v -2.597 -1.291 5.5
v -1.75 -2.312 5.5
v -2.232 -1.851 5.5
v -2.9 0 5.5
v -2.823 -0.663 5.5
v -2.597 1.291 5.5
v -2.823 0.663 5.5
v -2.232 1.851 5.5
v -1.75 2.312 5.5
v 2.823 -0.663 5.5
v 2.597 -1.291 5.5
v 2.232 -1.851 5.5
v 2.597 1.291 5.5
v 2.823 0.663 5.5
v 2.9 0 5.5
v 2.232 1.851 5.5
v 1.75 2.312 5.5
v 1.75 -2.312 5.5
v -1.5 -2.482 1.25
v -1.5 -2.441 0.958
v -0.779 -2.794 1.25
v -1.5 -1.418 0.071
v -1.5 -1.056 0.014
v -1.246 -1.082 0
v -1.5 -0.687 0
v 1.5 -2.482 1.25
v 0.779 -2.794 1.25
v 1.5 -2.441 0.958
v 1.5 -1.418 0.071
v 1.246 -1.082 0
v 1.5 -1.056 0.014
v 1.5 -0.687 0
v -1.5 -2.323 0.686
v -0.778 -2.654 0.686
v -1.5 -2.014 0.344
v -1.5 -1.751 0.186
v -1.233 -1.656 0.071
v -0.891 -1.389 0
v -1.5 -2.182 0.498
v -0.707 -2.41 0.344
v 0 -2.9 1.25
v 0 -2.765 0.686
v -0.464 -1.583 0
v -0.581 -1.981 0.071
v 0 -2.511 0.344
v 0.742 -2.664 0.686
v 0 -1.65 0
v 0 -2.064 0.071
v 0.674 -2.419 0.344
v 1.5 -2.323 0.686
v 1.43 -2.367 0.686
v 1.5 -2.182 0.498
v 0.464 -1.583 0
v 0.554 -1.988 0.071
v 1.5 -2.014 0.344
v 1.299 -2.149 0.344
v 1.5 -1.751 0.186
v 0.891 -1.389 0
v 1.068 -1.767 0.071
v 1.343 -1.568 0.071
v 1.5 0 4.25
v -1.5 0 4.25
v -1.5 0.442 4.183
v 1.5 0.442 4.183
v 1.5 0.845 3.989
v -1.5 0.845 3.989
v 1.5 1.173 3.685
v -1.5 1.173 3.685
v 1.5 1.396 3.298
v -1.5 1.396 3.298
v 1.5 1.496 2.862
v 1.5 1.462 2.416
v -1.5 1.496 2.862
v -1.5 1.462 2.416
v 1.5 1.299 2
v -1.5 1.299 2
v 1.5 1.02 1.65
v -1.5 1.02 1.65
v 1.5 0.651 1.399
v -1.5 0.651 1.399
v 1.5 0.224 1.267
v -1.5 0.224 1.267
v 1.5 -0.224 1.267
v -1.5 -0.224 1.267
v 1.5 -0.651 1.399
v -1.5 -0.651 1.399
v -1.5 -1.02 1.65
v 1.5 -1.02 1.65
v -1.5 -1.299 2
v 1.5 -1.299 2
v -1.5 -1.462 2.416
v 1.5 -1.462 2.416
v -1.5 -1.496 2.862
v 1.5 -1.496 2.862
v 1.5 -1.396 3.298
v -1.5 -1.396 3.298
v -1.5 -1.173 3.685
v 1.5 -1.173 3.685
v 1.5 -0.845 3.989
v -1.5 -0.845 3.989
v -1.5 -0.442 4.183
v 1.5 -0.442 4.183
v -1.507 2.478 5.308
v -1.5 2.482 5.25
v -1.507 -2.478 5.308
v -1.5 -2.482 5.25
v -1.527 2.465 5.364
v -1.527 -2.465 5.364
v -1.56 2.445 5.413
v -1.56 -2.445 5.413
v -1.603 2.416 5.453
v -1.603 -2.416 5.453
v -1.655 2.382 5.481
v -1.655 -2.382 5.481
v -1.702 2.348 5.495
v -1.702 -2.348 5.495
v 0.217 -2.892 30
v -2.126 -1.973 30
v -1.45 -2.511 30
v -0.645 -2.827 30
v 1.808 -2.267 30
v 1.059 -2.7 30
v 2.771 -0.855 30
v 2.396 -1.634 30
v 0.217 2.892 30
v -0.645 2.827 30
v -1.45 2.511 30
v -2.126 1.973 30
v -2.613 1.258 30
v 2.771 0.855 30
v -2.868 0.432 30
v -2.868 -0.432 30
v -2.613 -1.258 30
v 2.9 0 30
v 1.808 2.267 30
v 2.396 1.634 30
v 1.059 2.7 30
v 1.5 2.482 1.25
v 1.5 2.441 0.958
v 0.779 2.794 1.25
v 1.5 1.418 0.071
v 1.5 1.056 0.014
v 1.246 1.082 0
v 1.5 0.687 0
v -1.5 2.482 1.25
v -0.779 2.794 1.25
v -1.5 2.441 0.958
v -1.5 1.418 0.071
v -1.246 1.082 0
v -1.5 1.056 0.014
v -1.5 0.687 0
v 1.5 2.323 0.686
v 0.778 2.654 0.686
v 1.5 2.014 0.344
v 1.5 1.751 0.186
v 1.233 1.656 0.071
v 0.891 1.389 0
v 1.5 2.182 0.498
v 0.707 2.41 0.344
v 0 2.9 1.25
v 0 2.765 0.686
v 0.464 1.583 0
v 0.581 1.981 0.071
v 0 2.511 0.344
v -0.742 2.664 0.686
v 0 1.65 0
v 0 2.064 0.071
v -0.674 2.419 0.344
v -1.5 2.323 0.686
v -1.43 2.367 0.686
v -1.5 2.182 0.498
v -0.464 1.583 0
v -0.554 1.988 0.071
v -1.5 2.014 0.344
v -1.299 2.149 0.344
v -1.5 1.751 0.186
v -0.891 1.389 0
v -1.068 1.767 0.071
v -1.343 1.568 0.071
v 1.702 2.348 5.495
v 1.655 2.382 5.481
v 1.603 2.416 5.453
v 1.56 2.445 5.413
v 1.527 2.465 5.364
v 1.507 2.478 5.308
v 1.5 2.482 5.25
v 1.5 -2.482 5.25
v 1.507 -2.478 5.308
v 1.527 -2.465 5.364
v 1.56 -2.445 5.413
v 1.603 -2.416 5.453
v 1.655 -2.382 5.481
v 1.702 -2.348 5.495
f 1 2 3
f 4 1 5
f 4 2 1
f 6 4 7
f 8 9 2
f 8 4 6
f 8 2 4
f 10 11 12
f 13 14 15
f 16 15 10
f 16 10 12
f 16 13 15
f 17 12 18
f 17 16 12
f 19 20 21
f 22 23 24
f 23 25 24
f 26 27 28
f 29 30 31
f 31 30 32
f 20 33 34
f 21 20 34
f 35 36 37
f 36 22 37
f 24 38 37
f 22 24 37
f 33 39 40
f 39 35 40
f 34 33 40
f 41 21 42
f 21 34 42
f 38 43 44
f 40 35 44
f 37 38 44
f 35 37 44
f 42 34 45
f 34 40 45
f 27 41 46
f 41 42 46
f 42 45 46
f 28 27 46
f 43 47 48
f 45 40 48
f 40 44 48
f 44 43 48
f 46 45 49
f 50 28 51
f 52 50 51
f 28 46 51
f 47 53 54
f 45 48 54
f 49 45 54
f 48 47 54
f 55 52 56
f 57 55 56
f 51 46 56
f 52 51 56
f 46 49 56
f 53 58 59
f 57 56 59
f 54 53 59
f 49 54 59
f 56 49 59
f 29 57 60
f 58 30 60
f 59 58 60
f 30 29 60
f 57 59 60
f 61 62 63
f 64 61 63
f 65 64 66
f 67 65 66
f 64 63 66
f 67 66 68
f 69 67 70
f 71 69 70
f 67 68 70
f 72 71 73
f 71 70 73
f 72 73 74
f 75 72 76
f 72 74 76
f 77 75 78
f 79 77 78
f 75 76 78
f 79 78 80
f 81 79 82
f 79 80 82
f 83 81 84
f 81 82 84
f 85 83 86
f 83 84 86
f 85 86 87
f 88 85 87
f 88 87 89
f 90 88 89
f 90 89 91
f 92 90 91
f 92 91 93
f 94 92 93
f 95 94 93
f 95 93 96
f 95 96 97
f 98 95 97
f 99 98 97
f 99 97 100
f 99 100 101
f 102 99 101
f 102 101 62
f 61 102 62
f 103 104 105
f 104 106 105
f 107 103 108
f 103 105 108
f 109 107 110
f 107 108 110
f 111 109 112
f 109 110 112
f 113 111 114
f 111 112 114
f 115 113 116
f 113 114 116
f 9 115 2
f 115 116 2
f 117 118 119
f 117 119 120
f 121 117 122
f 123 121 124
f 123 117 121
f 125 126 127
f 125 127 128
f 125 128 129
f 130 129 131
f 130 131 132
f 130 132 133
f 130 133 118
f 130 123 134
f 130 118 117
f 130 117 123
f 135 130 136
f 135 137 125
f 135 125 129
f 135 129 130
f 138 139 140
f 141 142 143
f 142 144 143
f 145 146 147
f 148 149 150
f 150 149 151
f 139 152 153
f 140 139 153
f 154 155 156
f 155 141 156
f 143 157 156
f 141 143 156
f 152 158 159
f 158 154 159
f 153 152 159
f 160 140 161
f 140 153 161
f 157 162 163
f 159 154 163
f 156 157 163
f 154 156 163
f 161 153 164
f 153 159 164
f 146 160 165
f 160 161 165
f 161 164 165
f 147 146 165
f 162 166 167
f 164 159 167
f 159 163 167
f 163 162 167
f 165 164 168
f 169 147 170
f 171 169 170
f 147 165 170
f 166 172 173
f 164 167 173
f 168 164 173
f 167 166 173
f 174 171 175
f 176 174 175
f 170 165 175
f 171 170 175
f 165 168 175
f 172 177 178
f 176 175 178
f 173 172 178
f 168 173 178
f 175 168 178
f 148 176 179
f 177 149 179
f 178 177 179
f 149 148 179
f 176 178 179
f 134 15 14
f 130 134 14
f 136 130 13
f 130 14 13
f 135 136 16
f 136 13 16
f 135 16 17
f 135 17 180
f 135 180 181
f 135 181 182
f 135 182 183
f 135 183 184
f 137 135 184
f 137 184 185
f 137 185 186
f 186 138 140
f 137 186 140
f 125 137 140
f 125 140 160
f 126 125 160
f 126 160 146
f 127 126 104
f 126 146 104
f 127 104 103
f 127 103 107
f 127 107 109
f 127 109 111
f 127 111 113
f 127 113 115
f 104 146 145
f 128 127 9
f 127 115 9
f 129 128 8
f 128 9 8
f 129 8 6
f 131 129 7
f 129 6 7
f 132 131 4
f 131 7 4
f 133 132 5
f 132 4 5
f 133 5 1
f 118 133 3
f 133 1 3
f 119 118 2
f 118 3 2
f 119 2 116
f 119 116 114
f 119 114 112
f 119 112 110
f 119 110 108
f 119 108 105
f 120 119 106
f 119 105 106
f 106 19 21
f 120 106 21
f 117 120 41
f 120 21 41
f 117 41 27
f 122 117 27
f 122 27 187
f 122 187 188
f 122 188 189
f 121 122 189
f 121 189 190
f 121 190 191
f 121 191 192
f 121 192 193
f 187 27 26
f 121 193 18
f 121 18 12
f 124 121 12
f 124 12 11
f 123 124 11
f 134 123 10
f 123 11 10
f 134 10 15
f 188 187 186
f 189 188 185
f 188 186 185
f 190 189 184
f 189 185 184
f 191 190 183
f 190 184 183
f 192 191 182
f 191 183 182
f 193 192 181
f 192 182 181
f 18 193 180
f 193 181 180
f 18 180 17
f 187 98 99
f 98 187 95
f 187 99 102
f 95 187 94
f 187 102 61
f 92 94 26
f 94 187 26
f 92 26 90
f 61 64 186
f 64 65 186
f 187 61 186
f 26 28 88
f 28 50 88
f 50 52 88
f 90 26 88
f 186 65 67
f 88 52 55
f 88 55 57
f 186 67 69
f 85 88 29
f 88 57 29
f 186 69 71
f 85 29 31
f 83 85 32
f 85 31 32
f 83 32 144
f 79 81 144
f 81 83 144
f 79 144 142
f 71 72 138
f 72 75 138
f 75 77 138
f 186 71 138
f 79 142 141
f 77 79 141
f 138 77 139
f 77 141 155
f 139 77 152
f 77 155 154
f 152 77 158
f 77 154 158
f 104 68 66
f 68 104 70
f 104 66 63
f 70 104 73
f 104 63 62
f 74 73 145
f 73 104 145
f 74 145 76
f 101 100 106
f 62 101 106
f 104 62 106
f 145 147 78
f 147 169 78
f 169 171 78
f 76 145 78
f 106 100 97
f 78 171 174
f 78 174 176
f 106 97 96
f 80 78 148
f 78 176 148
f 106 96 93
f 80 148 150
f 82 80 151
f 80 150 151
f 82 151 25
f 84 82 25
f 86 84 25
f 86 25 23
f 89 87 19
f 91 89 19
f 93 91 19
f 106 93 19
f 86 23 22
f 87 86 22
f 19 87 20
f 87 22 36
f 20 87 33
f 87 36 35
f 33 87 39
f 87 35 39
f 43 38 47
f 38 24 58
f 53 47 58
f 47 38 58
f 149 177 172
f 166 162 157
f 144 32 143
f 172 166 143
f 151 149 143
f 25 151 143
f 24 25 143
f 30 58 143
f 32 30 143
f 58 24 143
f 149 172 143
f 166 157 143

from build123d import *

# Parameters (mm, degrees)
SKETCH1_R           = 2.9
BOSS_EXTRUDE1_DEPTH = 30
CUT_EXTRUDE1_DEPTH  = 5.5
SKETCH3_R           = 1.5
CUT_EXTRUDE2_DEPTH  = 31.45931713
FILLET1_R           = 1.25
FILLET2_R           = 0.25


with BuildPart() as part:
    # Sketch1 → Boss-Extrude1 (new body)
    with BuildSketch(Plane.XY):
        Circle(SKETCH1_R)
    extrude(amount=BOSS_EXTRUDE1_DEPTH)

    # Sketch2 → Cut-Extrude1 (cut)
    with BuildSketch(Plane(origin=(0, 0, 0), x_dir=(-1, 0, 0), z_dir=(0, 0, -1))):
        with BuildLine():
            Line((-1.5, -2.481934729), (-1.5, 2.481934729))
            ThreePointArc((-1.5, 2.481934729), (-2.9, 0), (-1.5, -2.481934729))
        make_face()
        with BuildLine():
            ThreePointArc((2.9, 0), (2.525866188, 1.424780685), (1.5, 2.481934729))
            Line((1.5, 2.481934729), (1.5, -2.481934729))
            ThreePointArc((1.5, -2.481934729), (2.525866188, -1.424780685), (2.9, 0))
        make_face()
    extrude(amount=-CUT_EXTRUDE1_DEPTH, mode=Mode.SUBTRACT)

    # Sketch3 → Cut-Extrude2 (cut, through all)
    with BuildSketch(Plane.ZY.offset(1.5)):
        with Locations((2.75, 0)):
            Circle(SKETCH3_R)
    extrude(amount=-CUT_EXTRUDE2_DEPTH, mode=Mode.SUBTRACT)

    # Fillet1
    fillet1_edges = [part.edges().sort_by_distance(p)[0] for p in [
        (0, 2.9, 0),
        (0, -2.9, 0),
    ]]
    fillet(fillet1_edges, radius=FILLET1_R)

    # Fillet2
    fillet2_edges = [part.edges().sort_by_distance(p)[0] for p in [
        (1.5, 0, 5.5),
        (-1.5, 0, 5.5),
    ]]
    fillet(fillet2_edges, radius=FILLET2_R)


solid = part.part
